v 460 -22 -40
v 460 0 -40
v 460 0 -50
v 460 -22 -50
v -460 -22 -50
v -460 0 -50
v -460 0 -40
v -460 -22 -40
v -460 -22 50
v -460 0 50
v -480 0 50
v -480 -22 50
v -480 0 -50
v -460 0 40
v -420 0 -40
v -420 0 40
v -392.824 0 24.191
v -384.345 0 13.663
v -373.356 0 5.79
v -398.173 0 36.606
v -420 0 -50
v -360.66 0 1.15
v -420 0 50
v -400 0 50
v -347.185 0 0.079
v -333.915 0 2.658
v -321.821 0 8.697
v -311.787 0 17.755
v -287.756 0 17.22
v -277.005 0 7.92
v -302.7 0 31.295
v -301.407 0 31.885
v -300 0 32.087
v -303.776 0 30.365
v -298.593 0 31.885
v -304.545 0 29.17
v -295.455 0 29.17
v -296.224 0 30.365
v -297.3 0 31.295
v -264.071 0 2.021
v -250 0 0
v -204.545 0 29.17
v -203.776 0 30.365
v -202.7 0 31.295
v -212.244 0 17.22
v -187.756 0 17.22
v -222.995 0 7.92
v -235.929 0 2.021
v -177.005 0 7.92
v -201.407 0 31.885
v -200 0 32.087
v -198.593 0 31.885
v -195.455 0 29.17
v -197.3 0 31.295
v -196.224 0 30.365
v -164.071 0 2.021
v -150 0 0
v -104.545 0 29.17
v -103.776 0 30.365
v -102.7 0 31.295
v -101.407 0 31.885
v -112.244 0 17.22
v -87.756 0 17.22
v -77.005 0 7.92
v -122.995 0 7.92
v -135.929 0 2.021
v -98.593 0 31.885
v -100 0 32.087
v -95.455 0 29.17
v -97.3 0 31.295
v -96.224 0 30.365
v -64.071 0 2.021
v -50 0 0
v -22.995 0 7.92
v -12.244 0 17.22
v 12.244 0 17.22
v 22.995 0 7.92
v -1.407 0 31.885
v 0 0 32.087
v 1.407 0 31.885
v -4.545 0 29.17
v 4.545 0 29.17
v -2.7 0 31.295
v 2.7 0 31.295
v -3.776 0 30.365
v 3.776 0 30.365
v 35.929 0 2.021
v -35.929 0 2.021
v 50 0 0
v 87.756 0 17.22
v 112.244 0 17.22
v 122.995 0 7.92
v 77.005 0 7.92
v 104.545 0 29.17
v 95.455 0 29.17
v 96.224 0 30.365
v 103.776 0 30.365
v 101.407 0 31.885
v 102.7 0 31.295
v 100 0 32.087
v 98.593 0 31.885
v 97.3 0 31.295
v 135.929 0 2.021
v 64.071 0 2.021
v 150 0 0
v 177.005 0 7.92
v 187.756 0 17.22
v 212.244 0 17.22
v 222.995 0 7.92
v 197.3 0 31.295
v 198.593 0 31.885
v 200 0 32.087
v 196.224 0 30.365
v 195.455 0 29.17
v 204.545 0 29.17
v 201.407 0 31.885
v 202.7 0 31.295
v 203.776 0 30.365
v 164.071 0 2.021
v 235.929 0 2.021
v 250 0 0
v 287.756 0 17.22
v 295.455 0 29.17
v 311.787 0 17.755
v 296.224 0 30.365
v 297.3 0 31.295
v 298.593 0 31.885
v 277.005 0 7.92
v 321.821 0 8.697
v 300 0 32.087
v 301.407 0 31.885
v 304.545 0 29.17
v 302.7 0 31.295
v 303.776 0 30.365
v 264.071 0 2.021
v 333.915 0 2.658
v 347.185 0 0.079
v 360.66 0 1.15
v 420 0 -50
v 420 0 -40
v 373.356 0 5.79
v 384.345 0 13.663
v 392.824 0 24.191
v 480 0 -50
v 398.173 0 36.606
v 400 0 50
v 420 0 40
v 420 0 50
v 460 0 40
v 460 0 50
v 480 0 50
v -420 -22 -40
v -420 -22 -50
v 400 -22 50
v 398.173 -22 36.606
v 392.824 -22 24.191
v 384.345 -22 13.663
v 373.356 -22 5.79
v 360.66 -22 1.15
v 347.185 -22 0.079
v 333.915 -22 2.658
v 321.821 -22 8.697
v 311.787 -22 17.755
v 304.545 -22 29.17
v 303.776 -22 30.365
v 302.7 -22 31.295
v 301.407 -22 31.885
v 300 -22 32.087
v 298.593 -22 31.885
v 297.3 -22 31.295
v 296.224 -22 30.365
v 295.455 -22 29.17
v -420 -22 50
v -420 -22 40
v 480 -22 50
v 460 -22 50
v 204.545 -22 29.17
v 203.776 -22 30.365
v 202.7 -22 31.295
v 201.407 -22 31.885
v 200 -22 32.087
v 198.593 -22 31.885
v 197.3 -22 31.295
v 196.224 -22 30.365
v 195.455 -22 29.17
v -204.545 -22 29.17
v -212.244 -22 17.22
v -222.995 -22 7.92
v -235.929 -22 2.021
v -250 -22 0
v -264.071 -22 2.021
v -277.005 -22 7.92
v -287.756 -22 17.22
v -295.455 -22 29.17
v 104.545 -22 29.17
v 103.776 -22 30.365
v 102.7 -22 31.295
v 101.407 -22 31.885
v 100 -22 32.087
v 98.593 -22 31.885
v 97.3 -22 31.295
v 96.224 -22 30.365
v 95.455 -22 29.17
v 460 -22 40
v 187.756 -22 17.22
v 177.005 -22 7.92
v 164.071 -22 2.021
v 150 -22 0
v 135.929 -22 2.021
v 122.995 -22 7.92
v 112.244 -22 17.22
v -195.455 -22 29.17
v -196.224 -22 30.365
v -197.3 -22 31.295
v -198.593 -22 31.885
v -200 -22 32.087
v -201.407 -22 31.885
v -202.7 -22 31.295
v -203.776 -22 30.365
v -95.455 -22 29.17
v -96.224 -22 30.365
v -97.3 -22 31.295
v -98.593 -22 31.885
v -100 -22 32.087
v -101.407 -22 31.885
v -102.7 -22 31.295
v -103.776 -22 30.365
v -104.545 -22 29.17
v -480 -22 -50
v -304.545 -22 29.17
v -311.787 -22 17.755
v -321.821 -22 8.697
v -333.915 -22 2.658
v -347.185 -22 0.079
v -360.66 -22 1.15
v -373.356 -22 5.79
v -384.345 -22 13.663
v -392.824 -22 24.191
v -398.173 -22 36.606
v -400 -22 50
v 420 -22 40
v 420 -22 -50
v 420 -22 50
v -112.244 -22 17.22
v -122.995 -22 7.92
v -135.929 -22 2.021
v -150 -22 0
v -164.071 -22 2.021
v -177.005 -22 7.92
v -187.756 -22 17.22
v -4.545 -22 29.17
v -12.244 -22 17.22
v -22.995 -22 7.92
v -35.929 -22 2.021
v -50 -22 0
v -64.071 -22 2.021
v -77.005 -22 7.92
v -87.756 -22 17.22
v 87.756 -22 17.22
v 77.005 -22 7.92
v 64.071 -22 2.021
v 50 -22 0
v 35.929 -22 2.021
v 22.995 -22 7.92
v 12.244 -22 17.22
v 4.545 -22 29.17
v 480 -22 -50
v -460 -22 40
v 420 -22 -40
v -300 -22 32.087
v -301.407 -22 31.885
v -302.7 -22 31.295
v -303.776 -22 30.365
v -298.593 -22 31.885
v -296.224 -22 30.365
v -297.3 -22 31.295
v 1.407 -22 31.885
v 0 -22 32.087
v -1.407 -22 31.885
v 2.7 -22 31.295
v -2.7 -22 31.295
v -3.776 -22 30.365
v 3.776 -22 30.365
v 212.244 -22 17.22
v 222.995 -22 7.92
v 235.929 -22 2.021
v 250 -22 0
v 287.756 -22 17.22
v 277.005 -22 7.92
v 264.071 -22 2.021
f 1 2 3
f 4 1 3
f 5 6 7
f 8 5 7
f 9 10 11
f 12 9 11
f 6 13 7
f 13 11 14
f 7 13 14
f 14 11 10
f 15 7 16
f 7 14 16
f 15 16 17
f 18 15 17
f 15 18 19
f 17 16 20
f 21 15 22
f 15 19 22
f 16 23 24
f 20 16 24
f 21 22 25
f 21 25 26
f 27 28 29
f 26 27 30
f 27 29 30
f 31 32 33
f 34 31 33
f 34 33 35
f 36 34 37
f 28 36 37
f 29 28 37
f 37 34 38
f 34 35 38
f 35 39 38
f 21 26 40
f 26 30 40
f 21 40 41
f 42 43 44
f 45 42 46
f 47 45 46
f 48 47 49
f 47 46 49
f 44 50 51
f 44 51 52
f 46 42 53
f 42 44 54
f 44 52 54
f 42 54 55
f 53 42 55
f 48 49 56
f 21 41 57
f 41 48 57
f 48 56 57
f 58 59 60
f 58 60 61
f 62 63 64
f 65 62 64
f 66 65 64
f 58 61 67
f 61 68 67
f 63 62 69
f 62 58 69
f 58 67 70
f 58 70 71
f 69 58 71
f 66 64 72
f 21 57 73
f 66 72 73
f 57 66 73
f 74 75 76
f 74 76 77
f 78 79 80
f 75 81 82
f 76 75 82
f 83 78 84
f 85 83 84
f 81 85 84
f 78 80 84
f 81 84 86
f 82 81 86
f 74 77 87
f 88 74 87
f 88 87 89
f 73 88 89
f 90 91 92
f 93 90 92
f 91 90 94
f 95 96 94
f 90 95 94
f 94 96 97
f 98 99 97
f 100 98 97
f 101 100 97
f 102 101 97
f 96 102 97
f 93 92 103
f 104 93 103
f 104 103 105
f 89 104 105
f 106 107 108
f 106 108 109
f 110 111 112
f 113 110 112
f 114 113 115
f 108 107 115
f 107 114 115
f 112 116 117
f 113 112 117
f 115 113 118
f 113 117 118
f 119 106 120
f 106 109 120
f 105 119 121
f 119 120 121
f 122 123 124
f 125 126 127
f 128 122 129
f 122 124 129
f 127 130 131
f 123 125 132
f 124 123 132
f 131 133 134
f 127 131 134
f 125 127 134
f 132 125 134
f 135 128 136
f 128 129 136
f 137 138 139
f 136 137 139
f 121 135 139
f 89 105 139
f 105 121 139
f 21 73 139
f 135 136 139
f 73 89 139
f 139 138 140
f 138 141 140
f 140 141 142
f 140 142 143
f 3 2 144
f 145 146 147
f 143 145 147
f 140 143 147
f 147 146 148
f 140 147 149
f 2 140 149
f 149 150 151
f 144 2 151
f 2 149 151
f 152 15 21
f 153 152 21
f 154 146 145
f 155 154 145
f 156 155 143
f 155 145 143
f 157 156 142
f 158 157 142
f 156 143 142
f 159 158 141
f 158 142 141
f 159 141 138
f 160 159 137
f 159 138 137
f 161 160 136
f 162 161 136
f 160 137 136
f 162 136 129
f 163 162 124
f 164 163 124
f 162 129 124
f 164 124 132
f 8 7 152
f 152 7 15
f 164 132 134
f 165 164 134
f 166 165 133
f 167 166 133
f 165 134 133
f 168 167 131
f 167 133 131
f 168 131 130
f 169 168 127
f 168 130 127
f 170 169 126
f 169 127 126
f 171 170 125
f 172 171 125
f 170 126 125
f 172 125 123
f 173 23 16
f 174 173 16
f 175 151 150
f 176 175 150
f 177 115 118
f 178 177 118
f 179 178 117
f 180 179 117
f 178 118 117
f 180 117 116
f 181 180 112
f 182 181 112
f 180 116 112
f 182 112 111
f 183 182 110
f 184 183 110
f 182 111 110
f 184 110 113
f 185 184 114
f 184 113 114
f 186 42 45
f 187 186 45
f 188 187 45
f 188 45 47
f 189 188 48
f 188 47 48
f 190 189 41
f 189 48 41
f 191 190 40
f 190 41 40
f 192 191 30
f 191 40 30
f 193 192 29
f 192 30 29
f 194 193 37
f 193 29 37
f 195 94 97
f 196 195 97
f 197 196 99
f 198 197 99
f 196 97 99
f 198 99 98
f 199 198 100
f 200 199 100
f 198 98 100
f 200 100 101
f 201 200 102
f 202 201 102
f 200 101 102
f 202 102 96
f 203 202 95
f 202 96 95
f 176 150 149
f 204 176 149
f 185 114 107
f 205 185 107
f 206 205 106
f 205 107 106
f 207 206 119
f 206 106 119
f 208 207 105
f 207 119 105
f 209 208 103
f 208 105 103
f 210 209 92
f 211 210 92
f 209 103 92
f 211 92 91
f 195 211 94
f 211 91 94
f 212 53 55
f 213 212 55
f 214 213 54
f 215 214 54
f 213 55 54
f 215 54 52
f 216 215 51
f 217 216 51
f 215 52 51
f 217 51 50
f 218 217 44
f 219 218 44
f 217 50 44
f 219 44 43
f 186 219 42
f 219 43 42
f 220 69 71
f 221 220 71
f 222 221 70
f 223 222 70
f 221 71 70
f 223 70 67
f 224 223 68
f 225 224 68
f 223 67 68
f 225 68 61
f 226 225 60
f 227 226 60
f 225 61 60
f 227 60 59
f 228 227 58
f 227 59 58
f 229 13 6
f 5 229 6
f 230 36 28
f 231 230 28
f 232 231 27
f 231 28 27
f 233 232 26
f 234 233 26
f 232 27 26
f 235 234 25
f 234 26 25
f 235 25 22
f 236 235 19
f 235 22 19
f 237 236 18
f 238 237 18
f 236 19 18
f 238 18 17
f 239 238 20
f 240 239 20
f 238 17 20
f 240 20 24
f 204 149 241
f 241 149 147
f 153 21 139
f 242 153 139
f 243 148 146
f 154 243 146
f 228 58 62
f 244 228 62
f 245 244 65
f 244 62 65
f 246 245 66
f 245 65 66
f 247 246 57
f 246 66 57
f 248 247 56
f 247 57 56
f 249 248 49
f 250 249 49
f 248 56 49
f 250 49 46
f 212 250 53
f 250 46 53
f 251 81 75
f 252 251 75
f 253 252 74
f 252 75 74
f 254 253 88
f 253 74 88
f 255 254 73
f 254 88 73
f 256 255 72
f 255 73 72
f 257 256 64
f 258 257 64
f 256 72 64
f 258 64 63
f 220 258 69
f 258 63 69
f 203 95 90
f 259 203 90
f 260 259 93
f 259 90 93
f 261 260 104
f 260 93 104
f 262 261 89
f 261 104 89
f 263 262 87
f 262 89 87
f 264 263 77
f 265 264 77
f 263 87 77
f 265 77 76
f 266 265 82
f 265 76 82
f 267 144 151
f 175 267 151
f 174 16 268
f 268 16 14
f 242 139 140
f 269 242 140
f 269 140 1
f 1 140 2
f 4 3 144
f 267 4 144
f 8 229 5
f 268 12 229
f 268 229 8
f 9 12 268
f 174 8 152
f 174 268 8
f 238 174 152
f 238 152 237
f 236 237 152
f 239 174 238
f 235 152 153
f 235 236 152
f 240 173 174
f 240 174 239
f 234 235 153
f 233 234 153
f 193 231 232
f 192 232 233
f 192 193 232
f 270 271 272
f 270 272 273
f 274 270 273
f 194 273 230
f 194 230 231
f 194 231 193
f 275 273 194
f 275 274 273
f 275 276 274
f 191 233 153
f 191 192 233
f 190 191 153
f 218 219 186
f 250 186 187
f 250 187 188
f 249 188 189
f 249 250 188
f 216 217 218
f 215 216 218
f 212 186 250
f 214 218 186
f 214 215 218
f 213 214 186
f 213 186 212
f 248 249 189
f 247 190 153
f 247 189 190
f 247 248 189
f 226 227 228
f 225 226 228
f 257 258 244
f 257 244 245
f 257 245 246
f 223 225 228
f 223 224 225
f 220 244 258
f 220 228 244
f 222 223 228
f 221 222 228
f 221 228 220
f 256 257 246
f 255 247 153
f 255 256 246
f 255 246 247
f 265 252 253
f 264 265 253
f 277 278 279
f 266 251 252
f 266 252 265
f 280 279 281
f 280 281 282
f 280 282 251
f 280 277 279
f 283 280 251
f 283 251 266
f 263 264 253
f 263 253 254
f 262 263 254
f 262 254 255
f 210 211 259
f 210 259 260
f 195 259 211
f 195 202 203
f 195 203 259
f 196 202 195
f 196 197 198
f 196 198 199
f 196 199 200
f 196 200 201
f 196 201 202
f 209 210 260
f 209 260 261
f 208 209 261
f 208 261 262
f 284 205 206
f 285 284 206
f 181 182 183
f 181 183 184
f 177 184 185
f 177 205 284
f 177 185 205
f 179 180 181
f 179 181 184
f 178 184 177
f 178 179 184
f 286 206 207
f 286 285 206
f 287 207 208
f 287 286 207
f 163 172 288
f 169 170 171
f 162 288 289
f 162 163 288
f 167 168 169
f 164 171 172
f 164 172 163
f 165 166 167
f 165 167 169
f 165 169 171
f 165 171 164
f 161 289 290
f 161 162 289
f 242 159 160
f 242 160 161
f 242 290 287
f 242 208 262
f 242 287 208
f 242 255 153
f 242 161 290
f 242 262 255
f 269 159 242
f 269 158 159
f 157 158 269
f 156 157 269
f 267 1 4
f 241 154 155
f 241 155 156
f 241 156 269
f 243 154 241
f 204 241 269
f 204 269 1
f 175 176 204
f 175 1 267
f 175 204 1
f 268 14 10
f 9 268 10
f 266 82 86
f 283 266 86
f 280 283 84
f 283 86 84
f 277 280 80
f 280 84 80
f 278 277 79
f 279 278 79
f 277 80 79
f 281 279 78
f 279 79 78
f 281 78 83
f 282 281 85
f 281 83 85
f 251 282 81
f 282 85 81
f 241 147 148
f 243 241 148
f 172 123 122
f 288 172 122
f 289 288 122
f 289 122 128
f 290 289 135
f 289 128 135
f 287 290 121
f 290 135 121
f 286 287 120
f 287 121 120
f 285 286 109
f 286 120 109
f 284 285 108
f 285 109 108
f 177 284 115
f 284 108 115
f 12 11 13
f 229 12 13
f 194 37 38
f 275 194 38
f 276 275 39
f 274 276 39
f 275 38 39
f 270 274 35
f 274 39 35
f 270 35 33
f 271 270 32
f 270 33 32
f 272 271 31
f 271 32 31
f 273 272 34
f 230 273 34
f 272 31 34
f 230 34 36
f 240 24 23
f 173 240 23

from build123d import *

# Parameters (mm, degrees)
F1_DEPTH = 22


with BuildPart() as f1:
    # F0 (on Front) → F1 (new body)
    with BuildSketch(Plane.XZ):
        with BuildLine():
            Line((460, -50), (480, -50))
            Line((480, -50), (480, 50))
            Line((480, 50), (460, 50))
            Line((460, 50), (460, 40))
            Line((460, 40), (420, 40))
            Line((420, 40), (420, 50))
            Line((420, 50), (400, 50))
            ThreePointArc((400, 50), (360.660036, 1.149579), (304.545455, 29.17011))
            ThreePointArc((304.545455, 29.17011), (300, 32.087122), (295.454545, 29.17011))
            ThreePointArc((295.454545, 29.17011), (250, 0), (204.545455, 29.17011))
            ThreePointArc((204.545455, 29.17011), (200, 32.087122), (195.454545, 29.17011))
            ThreePointArc((195.454545, 29.17011), (150, 0), (104.545455, 29.17011))
            ThreePointArc((104.545455, 29.17011), (100, 32.087122), (95.454545, 29.17011))
            ThreePointArc((95.454545, 29.17011), (50, 0), (4.545455, 29.17011))
            ThreePointArc((4.545455, 29.17011), (0, 32.087122), (-4.545455, 29.17011))
            ThreePointArc((-4.545455, 29.17011), (-50, 0), (-95.454545, 29.17011))
            ThreePointArc((-95.454545, 29.17011), (-100, 32.087122), (-104.545455, 29.17011))
            ThreePointArc((-104.545455, 29.17011), (-150, 0), (-195.454545, 29.17011))
            ThreePointArc((-195.454545, 29.17011), (-200, 32.087122), (-204.545455, 29.17011))
            ThreePointArc((-204.545455, 29.17011), (-250, 0), (-295.454545, 29.17011))
            ThreePointArc((-295.454545, 29.17011), (-300, 32.087122), (-304.545455, 29.17011))
            ThreePointArc((-304.545455, 29.17011), (-360.660036, 1.149579), (-400, 50))
            Line((-400, 50), (-420, 50))
            Line((-420, 50), (-420, 40))
            Line((-420, 40), (-460, 40))
            Line((-460, 40), (-460, 50))
            Line((-460, 50), (-480, 50))
            Line((-480, 50), (-480, -50))
            Line((-480, -50), (-460, -50))
            Line((-460, -50), (-460, -40))
            Line((-460, -40), (-420, -40))
            Line((-420, -40), (-420, -50))
            Line((-420, -50), (420, -50))
            Line((420, -50), (420, -40))
            Line((420, -40), (460, -40))
            Line((460, -40), (460, -50))
        make_face()
    extrude(amount=F1_DEPTH)


solid = f1.part
